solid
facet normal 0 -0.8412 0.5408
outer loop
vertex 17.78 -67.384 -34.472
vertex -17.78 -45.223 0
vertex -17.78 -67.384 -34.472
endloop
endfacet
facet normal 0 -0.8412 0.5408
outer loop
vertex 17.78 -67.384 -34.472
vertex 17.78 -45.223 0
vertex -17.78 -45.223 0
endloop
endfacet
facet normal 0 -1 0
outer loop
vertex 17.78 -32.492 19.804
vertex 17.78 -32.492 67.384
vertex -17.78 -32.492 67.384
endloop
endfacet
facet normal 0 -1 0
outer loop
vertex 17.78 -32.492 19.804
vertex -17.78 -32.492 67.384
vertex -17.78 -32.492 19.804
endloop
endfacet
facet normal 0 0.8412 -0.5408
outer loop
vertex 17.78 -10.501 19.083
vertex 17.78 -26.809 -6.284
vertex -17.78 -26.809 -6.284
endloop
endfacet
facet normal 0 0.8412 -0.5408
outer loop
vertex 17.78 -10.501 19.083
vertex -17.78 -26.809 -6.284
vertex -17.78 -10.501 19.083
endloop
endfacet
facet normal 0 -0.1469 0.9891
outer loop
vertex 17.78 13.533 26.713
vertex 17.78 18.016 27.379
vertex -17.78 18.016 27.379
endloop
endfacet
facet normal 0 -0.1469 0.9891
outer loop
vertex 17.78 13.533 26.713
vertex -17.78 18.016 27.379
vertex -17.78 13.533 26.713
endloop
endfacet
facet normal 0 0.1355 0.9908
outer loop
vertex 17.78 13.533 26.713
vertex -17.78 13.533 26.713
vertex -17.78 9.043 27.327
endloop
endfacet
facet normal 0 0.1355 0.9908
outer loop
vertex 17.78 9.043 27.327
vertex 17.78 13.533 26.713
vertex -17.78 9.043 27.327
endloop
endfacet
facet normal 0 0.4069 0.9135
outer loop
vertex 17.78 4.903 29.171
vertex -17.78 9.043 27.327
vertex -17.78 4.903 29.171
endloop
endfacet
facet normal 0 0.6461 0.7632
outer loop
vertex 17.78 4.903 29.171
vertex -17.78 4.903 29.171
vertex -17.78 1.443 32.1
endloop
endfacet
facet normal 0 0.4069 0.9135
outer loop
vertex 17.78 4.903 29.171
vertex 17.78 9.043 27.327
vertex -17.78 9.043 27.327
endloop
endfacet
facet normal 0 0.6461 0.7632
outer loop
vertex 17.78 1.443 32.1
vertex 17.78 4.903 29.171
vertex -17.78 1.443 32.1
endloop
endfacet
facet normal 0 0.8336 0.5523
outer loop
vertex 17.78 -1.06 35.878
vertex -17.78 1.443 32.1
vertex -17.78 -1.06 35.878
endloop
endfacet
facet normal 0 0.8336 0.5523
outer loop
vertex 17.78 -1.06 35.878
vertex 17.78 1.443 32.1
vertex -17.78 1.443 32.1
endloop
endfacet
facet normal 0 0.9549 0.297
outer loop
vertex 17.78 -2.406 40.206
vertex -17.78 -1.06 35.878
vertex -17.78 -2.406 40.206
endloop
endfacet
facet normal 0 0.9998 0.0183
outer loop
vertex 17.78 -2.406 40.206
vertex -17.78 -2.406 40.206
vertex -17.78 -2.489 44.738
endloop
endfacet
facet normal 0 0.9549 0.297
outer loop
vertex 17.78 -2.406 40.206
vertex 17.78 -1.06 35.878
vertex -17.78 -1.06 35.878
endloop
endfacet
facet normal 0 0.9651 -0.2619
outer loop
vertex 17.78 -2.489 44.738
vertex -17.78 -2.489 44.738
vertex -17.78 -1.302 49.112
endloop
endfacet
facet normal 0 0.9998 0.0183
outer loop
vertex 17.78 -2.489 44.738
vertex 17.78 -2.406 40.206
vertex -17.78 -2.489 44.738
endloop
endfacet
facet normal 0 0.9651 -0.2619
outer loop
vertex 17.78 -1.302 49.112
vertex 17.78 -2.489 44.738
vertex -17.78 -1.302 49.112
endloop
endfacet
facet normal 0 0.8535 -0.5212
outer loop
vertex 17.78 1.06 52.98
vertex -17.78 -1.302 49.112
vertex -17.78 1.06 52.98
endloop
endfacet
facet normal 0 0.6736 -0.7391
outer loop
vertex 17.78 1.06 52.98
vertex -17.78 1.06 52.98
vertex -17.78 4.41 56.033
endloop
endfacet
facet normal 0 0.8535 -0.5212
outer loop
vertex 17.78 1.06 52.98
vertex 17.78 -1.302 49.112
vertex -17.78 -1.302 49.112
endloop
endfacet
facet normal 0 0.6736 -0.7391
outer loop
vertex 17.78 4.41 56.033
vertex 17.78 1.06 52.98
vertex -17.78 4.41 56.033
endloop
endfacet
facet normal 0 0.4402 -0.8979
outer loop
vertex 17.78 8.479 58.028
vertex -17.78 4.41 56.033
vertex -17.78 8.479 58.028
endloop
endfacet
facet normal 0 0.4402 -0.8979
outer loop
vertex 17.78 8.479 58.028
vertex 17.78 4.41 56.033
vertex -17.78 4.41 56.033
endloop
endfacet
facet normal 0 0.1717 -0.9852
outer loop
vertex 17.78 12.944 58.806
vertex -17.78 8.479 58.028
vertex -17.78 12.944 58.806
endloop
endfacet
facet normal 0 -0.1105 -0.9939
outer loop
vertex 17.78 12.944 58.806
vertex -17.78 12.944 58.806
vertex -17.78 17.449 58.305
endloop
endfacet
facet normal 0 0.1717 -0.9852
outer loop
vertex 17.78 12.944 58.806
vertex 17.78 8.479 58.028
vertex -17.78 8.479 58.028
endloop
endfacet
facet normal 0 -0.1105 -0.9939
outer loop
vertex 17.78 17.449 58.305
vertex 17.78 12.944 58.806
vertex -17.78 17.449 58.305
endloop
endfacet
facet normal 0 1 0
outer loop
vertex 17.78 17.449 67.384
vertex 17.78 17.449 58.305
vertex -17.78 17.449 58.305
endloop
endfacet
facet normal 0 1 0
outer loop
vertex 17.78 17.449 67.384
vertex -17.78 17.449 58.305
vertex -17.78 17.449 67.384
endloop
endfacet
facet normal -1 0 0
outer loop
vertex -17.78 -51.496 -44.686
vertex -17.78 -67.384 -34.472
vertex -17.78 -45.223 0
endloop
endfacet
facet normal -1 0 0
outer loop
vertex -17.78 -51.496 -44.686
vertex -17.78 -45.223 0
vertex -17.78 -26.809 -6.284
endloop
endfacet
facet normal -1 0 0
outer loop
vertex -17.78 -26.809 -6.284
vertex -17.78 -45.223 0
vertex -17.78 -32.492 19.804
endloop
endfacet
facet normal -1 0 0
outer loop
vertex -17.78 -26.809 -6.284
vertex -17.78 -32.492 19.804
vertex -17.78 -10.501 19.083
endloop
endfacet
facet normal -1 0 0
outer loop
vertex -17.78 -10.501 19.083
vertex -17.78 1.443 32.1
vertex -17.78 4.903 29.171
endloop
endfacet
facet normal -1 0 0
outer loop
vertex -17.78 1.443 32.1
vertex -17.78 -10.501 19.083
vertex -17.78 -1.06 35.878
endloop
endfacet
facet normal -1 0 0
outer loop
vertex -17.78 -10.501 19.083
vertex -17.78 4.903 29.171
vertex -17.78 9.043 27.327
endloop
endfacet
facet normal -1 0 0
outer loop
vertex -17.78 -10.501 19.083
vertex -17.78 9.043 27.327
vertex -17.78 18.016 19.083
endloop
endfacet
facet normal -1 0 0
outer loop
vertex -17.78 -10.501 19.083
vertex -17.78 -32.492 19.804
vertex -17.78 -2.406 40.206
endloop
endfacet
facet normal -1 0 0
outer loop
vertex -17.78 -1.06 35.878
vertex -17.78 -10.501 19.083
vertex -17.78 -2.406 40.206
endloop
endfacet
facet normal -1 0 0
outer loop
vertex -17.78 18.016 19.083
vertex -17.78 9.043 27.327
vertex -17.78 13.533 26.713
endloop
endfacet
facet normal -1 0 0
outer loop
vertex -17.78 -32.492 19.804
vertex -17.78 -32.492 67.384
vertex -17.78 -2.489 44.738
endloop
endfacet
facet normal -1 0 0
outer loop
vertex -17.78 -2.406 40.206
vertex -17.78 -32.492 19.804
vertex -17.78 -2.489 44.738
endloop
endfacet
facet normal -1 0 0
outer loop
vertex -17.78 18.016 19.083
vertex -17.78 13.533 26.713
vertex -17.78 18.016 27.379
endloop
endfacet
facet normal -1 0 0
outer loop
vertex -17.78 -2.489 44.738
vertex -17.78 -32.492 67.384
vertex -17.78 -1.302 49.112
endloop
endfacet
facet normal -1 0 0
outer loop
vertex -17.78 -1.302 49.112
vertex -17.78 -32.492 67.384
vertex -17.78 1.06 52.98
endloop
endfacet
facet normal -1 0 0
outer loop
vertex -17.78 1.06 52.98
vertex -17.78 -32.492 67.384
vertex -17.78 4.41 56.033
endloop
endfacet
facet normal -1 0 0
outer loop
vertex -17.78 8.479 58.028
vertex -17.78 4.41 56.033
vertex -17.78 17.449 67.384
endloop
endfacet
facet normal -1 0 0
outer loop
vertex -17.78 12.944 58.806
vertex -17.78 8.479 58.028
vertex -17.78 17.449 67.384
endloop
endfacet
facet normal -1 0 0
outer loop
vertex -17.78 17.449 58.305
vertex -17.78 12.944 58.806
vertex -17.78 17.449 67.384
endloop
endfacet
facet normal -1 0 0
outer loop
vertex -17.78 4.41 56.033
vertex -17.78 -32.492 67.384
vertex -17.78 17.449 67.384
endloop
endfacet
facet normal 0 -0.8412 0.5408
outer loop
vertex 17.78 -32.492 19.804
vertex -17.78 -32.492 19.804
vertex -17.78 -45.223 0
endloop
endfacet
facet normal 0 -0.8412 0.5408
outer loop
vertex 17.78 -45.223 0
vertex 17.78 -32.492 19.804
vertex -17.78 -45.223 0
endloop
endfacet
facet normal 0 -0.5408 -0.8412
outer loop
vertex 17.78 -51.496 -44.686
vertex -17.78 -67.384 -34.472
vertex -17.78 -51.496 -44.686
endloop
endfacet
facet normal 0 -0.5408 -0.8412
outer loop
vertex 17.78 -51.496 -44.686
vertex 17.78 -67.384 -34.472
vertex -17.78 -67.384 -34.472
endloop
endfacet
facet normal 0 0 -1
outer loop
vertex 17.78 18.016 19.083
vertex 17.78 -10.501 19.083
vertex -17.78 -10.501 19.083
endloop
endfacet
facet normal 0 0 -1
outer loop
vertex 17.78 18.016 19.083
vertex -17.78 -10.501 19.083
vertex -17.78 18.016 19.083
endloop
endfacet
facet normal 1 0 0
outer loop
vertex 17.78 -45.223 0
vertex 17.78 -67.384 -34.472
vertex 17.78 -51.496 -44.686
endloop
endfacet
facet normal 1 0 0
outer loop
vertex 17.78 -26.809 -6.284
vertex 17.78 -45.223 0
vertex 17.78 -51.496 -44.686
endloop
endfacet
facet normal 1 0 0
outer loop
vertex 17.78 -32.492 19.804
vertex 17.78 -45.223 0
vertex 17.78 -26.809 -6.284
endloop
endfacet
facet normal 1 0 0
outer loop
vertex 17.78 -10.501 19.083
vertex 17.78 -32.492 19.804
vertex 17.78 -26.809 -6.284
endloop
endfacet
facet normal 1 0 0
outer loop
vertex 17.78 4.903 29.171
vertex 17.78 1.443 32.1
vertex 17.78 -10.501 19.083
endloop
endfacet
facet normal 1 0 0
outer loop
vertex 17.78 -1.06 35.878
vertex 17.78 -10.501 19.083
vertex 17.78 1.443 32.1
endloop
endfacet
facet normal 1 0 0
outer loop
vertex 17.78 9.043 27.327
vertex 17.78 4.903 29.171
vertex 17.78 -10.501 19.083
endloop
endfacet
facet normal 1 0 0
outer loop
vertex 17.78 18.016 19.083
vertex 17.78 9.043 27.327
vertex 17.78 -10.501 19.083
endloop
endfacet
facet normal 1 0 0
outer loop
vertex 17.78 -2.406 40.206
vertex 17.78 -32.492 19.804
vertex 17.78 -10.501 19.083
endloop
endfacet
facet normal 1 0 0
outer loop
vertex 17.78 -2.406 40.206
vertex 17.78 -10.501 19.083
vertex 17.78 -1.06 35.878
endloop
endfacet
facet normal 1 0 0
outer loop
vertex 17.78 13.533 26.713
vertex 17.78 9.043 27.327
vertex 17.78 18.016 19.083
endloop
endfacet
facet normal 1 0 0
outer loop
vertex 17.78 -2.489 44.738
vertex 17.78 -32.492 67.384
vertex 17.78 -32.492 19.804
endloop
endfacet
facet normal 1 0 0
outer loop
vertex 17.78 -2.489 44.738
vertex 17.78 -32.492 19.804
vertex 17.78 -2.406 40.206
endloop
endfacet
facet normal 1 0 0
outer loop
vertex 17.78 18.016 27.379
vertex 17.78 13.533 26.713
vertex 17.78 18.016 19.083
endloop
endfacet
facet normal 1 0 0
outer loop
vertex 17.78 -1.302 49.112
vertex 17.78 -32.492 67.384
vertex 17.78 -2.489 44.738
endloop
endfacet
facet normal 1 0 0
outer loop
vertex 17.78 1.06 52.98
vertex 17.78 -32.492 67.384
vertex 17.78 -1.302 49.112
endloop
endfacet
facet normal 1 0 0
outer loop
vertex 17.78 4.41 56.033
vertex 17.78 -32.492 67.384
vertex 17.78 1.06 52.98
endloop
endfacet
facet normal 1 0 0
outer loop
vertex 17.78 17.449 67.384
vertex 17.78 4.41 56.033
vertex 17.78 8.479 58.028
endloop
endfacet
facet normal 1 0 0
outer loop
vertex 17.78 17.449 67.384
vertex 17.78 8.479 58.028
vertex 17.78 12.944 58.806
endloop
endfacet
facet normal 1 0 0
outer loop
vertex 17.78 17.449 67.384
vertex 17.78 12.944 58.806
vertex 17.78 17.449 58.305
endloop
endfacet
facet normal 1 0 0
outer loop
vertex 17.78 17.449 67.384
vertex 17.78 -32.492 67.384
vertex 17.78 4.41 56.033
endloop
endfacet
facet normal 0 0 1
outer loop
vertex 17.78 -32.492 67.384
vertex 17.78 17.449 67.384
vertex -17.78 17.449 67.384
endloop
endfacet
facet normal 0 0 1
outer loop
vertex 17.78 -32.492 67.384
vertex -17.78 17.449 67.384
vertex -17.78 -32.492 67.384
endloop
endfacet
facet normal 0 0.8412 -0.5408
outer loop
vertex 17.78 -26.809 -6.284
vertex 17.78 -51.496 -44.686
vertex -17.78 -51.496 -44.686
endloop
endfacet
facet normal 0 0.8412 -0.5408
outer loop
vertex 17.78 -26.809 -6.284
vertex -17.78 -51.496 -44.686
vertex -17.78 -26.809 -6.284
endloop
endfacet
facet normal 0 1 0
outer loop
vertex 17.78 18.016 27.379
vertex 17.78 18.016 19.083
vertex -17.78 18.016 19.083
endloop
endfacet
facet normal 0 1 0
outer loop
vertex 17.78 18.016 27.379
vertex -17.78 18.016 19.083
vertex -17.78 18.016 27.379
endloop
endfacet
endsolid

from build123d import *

# Parameters (mm, degrees)
F1_DEPTH = 17.78


with BuildPart() as f1:
    # F0 (on Right) → F1 (new body, symmetric)
    with BuildSketch(Plane.YZ):
        with BuildLine():
            Line((-67.38431, -34.472395), (-51.495798, -44.68644))
            Line((-51.495798, -44.68644), (-26.808784, -6.284426))
            Line((-26.808784, -6.284426), (-10.501343, 19.082699))
            Line((-10.501343, 19.082699), (18.016437, 19.082699))
            Line((18.016437, 19.082699), (18.016437, 27.379308))
            ThreePointArc((18.016437, 27.379308), (-2.608516, 42.469), (17.44899, 58.305159))
            Line((17.44899, 58.305159), (17.44899, 67.38431))
            Line((17.44899, 67.38431), (-32.492471, 67.38431))
            Line((-32.492471, 67.38431), (-32.492471, 19.803789))
            Line((-32.492471, 19.803789), (-45.22348, 0))
            Line((-45.22348, 0), (-67.38431, -34.472395))
        make_face()
    extrude(amount=F1_DEPTH, both=True)


solid = f1.part
